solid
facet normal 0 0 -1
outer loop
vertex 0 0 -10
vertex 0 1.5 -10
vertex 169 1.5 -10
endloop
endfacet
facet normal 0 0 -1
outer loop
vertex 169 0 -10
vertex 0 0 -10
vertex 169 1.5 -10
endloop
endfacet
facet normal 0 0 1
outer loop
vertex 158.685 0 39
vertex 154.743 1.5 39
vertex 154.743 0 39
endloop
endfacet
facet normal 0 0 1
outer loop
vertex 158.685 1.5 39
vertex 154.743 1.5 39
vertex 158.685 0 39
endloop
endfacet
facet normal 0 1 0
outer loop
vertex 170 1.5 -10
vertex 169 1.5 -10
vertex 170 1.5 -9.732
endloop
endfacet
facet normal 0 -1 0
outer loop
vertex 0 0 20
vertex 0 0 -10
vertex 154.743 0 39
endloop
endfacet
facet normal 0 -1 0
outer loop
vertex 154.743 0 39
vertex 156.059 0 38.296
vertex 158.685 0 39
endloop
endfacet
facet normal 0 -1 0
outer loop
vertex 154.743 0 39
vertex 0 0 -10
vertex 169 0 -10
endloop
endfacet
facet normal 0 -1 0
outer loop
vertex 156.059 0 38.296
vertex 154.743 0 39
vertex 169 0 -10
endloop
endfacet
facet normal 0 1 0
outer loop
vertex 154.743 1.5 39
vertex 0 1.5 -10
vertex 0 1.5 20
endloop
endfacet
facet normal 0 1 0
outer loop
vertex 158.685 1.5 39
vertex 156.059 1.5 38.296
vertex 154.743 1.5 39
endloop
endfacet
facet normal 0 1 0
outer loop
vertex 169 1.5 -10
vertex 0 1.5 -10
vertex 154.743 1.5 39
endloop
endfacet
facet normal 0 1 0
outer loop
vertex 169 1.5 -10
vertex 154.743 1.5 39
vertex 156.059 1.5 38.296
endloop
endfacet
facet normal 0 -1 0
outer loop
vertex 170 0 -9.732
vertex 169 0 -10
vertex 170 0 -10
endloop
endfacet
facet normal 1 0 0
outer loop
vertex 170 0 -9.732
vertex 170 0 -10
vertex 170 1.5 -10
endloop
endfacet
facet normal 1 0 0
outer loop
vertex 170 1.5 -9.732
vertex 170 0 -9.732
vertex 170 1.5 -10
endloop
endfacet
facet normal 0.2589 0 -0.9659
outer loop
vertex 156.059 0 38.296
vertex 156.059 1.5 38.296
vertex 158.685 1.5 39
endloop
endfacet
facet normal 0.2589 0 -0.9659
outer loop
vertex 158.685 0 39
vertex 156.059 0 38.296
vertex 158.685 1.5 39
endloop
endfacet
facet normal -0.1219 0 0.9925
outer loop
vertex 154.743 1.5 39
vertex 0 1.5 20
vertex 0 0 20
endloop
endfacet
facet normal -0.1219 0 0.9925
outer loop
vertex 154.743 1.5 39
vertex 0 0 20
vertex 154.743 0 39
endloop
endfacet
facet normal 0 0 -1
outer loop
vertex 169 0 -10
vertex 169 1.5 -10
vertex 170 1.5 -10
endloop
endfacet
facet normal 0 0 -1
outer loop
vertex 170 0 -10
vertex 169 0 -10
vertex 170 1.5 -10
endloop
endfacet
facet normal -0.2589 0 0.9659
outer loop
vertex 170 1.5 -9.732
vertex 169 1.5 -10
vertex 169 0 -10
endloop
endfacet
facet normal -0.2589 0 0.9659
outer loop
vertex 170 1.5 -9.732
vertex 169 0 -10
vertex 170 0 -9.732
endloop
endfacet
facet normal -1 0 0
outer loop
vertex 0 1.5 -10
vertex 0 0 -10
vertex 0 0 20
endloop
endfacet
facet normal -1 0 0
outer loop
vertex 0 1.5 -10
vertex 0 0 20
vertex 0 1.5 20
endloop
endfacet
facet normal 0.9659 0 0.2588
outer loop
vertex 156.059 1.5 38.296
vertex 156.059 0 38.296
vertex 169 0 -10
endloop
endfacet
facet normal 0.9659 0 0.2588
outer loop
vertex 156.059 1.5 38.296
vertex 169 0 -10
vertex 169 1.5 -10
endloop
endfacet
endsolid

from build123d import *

# Parameters (mm, degrees)
BOX024_W               = 159
BOX024_H               = 170.5
BOX024_DEPTH           = 20.5
BOX024_PLACEMENT_ANGLE = 7
BOX023_W               = 25
BOX023_H               = 170
BOX023_DEPTH           = 50
BOX023_PLACEMENT_ANGLE = 15
BOX022_W               = 170
BOX022_H               = 1.5
BOX022_DEPTH           = 49


with BuildPart() as top001:
    # Box024 → Box024 (new body)
    with BuildSketch(Plane.XY):
        with Locations((79.5, 85.25)):
            Rectangle(BOX024_W, BOX024_H)
    extrude(amount=BOX024_DEPTH)


with BuildPart() as top001_1:
    # Box024 placement: moved
    add(top001.part.moved(Location((0, 0, 20))).rotate(Axis((0, 0, 20), (0, -1, 0)), BOX024_PLACEMENT_ANGLE))


with BuildPart() as face002:
    # Box023 → Box023 (new body)
    with BuildSketch(Plane.XY):
        with Locations((12.5, 85)):
            Rectangle(BOX023_W, BOX023_H)
    extrude(amount=BOX023_DEPTH)


with BuildPart() as face002_1:
    # Box023 placement: moved
    add(face002.part.moved(Location((169, -14, -10))).rotate(Axis((169, -14, -10), (0, -1, 0)), BOX023_PLACEMENT_ANGLE))


with BuildPart() as sidewall:
    # Box022 → Box022 (new body)
    with BuildSketch(Plane.XY.offset(-10)):
        with Locations((85, 0.75)):
            Rectangle(BOX022_W, BOX022_H)
    extrude(amount=BOX022_DEPTH)

    # Cut007: cut Face002
    add(face002_1.part, mode=Mode.SUBTRACT)

    # Cut008: cut top001
    add(top001_1.part, mode=Mode.SUBTRACT)


solid = sidewall.part
